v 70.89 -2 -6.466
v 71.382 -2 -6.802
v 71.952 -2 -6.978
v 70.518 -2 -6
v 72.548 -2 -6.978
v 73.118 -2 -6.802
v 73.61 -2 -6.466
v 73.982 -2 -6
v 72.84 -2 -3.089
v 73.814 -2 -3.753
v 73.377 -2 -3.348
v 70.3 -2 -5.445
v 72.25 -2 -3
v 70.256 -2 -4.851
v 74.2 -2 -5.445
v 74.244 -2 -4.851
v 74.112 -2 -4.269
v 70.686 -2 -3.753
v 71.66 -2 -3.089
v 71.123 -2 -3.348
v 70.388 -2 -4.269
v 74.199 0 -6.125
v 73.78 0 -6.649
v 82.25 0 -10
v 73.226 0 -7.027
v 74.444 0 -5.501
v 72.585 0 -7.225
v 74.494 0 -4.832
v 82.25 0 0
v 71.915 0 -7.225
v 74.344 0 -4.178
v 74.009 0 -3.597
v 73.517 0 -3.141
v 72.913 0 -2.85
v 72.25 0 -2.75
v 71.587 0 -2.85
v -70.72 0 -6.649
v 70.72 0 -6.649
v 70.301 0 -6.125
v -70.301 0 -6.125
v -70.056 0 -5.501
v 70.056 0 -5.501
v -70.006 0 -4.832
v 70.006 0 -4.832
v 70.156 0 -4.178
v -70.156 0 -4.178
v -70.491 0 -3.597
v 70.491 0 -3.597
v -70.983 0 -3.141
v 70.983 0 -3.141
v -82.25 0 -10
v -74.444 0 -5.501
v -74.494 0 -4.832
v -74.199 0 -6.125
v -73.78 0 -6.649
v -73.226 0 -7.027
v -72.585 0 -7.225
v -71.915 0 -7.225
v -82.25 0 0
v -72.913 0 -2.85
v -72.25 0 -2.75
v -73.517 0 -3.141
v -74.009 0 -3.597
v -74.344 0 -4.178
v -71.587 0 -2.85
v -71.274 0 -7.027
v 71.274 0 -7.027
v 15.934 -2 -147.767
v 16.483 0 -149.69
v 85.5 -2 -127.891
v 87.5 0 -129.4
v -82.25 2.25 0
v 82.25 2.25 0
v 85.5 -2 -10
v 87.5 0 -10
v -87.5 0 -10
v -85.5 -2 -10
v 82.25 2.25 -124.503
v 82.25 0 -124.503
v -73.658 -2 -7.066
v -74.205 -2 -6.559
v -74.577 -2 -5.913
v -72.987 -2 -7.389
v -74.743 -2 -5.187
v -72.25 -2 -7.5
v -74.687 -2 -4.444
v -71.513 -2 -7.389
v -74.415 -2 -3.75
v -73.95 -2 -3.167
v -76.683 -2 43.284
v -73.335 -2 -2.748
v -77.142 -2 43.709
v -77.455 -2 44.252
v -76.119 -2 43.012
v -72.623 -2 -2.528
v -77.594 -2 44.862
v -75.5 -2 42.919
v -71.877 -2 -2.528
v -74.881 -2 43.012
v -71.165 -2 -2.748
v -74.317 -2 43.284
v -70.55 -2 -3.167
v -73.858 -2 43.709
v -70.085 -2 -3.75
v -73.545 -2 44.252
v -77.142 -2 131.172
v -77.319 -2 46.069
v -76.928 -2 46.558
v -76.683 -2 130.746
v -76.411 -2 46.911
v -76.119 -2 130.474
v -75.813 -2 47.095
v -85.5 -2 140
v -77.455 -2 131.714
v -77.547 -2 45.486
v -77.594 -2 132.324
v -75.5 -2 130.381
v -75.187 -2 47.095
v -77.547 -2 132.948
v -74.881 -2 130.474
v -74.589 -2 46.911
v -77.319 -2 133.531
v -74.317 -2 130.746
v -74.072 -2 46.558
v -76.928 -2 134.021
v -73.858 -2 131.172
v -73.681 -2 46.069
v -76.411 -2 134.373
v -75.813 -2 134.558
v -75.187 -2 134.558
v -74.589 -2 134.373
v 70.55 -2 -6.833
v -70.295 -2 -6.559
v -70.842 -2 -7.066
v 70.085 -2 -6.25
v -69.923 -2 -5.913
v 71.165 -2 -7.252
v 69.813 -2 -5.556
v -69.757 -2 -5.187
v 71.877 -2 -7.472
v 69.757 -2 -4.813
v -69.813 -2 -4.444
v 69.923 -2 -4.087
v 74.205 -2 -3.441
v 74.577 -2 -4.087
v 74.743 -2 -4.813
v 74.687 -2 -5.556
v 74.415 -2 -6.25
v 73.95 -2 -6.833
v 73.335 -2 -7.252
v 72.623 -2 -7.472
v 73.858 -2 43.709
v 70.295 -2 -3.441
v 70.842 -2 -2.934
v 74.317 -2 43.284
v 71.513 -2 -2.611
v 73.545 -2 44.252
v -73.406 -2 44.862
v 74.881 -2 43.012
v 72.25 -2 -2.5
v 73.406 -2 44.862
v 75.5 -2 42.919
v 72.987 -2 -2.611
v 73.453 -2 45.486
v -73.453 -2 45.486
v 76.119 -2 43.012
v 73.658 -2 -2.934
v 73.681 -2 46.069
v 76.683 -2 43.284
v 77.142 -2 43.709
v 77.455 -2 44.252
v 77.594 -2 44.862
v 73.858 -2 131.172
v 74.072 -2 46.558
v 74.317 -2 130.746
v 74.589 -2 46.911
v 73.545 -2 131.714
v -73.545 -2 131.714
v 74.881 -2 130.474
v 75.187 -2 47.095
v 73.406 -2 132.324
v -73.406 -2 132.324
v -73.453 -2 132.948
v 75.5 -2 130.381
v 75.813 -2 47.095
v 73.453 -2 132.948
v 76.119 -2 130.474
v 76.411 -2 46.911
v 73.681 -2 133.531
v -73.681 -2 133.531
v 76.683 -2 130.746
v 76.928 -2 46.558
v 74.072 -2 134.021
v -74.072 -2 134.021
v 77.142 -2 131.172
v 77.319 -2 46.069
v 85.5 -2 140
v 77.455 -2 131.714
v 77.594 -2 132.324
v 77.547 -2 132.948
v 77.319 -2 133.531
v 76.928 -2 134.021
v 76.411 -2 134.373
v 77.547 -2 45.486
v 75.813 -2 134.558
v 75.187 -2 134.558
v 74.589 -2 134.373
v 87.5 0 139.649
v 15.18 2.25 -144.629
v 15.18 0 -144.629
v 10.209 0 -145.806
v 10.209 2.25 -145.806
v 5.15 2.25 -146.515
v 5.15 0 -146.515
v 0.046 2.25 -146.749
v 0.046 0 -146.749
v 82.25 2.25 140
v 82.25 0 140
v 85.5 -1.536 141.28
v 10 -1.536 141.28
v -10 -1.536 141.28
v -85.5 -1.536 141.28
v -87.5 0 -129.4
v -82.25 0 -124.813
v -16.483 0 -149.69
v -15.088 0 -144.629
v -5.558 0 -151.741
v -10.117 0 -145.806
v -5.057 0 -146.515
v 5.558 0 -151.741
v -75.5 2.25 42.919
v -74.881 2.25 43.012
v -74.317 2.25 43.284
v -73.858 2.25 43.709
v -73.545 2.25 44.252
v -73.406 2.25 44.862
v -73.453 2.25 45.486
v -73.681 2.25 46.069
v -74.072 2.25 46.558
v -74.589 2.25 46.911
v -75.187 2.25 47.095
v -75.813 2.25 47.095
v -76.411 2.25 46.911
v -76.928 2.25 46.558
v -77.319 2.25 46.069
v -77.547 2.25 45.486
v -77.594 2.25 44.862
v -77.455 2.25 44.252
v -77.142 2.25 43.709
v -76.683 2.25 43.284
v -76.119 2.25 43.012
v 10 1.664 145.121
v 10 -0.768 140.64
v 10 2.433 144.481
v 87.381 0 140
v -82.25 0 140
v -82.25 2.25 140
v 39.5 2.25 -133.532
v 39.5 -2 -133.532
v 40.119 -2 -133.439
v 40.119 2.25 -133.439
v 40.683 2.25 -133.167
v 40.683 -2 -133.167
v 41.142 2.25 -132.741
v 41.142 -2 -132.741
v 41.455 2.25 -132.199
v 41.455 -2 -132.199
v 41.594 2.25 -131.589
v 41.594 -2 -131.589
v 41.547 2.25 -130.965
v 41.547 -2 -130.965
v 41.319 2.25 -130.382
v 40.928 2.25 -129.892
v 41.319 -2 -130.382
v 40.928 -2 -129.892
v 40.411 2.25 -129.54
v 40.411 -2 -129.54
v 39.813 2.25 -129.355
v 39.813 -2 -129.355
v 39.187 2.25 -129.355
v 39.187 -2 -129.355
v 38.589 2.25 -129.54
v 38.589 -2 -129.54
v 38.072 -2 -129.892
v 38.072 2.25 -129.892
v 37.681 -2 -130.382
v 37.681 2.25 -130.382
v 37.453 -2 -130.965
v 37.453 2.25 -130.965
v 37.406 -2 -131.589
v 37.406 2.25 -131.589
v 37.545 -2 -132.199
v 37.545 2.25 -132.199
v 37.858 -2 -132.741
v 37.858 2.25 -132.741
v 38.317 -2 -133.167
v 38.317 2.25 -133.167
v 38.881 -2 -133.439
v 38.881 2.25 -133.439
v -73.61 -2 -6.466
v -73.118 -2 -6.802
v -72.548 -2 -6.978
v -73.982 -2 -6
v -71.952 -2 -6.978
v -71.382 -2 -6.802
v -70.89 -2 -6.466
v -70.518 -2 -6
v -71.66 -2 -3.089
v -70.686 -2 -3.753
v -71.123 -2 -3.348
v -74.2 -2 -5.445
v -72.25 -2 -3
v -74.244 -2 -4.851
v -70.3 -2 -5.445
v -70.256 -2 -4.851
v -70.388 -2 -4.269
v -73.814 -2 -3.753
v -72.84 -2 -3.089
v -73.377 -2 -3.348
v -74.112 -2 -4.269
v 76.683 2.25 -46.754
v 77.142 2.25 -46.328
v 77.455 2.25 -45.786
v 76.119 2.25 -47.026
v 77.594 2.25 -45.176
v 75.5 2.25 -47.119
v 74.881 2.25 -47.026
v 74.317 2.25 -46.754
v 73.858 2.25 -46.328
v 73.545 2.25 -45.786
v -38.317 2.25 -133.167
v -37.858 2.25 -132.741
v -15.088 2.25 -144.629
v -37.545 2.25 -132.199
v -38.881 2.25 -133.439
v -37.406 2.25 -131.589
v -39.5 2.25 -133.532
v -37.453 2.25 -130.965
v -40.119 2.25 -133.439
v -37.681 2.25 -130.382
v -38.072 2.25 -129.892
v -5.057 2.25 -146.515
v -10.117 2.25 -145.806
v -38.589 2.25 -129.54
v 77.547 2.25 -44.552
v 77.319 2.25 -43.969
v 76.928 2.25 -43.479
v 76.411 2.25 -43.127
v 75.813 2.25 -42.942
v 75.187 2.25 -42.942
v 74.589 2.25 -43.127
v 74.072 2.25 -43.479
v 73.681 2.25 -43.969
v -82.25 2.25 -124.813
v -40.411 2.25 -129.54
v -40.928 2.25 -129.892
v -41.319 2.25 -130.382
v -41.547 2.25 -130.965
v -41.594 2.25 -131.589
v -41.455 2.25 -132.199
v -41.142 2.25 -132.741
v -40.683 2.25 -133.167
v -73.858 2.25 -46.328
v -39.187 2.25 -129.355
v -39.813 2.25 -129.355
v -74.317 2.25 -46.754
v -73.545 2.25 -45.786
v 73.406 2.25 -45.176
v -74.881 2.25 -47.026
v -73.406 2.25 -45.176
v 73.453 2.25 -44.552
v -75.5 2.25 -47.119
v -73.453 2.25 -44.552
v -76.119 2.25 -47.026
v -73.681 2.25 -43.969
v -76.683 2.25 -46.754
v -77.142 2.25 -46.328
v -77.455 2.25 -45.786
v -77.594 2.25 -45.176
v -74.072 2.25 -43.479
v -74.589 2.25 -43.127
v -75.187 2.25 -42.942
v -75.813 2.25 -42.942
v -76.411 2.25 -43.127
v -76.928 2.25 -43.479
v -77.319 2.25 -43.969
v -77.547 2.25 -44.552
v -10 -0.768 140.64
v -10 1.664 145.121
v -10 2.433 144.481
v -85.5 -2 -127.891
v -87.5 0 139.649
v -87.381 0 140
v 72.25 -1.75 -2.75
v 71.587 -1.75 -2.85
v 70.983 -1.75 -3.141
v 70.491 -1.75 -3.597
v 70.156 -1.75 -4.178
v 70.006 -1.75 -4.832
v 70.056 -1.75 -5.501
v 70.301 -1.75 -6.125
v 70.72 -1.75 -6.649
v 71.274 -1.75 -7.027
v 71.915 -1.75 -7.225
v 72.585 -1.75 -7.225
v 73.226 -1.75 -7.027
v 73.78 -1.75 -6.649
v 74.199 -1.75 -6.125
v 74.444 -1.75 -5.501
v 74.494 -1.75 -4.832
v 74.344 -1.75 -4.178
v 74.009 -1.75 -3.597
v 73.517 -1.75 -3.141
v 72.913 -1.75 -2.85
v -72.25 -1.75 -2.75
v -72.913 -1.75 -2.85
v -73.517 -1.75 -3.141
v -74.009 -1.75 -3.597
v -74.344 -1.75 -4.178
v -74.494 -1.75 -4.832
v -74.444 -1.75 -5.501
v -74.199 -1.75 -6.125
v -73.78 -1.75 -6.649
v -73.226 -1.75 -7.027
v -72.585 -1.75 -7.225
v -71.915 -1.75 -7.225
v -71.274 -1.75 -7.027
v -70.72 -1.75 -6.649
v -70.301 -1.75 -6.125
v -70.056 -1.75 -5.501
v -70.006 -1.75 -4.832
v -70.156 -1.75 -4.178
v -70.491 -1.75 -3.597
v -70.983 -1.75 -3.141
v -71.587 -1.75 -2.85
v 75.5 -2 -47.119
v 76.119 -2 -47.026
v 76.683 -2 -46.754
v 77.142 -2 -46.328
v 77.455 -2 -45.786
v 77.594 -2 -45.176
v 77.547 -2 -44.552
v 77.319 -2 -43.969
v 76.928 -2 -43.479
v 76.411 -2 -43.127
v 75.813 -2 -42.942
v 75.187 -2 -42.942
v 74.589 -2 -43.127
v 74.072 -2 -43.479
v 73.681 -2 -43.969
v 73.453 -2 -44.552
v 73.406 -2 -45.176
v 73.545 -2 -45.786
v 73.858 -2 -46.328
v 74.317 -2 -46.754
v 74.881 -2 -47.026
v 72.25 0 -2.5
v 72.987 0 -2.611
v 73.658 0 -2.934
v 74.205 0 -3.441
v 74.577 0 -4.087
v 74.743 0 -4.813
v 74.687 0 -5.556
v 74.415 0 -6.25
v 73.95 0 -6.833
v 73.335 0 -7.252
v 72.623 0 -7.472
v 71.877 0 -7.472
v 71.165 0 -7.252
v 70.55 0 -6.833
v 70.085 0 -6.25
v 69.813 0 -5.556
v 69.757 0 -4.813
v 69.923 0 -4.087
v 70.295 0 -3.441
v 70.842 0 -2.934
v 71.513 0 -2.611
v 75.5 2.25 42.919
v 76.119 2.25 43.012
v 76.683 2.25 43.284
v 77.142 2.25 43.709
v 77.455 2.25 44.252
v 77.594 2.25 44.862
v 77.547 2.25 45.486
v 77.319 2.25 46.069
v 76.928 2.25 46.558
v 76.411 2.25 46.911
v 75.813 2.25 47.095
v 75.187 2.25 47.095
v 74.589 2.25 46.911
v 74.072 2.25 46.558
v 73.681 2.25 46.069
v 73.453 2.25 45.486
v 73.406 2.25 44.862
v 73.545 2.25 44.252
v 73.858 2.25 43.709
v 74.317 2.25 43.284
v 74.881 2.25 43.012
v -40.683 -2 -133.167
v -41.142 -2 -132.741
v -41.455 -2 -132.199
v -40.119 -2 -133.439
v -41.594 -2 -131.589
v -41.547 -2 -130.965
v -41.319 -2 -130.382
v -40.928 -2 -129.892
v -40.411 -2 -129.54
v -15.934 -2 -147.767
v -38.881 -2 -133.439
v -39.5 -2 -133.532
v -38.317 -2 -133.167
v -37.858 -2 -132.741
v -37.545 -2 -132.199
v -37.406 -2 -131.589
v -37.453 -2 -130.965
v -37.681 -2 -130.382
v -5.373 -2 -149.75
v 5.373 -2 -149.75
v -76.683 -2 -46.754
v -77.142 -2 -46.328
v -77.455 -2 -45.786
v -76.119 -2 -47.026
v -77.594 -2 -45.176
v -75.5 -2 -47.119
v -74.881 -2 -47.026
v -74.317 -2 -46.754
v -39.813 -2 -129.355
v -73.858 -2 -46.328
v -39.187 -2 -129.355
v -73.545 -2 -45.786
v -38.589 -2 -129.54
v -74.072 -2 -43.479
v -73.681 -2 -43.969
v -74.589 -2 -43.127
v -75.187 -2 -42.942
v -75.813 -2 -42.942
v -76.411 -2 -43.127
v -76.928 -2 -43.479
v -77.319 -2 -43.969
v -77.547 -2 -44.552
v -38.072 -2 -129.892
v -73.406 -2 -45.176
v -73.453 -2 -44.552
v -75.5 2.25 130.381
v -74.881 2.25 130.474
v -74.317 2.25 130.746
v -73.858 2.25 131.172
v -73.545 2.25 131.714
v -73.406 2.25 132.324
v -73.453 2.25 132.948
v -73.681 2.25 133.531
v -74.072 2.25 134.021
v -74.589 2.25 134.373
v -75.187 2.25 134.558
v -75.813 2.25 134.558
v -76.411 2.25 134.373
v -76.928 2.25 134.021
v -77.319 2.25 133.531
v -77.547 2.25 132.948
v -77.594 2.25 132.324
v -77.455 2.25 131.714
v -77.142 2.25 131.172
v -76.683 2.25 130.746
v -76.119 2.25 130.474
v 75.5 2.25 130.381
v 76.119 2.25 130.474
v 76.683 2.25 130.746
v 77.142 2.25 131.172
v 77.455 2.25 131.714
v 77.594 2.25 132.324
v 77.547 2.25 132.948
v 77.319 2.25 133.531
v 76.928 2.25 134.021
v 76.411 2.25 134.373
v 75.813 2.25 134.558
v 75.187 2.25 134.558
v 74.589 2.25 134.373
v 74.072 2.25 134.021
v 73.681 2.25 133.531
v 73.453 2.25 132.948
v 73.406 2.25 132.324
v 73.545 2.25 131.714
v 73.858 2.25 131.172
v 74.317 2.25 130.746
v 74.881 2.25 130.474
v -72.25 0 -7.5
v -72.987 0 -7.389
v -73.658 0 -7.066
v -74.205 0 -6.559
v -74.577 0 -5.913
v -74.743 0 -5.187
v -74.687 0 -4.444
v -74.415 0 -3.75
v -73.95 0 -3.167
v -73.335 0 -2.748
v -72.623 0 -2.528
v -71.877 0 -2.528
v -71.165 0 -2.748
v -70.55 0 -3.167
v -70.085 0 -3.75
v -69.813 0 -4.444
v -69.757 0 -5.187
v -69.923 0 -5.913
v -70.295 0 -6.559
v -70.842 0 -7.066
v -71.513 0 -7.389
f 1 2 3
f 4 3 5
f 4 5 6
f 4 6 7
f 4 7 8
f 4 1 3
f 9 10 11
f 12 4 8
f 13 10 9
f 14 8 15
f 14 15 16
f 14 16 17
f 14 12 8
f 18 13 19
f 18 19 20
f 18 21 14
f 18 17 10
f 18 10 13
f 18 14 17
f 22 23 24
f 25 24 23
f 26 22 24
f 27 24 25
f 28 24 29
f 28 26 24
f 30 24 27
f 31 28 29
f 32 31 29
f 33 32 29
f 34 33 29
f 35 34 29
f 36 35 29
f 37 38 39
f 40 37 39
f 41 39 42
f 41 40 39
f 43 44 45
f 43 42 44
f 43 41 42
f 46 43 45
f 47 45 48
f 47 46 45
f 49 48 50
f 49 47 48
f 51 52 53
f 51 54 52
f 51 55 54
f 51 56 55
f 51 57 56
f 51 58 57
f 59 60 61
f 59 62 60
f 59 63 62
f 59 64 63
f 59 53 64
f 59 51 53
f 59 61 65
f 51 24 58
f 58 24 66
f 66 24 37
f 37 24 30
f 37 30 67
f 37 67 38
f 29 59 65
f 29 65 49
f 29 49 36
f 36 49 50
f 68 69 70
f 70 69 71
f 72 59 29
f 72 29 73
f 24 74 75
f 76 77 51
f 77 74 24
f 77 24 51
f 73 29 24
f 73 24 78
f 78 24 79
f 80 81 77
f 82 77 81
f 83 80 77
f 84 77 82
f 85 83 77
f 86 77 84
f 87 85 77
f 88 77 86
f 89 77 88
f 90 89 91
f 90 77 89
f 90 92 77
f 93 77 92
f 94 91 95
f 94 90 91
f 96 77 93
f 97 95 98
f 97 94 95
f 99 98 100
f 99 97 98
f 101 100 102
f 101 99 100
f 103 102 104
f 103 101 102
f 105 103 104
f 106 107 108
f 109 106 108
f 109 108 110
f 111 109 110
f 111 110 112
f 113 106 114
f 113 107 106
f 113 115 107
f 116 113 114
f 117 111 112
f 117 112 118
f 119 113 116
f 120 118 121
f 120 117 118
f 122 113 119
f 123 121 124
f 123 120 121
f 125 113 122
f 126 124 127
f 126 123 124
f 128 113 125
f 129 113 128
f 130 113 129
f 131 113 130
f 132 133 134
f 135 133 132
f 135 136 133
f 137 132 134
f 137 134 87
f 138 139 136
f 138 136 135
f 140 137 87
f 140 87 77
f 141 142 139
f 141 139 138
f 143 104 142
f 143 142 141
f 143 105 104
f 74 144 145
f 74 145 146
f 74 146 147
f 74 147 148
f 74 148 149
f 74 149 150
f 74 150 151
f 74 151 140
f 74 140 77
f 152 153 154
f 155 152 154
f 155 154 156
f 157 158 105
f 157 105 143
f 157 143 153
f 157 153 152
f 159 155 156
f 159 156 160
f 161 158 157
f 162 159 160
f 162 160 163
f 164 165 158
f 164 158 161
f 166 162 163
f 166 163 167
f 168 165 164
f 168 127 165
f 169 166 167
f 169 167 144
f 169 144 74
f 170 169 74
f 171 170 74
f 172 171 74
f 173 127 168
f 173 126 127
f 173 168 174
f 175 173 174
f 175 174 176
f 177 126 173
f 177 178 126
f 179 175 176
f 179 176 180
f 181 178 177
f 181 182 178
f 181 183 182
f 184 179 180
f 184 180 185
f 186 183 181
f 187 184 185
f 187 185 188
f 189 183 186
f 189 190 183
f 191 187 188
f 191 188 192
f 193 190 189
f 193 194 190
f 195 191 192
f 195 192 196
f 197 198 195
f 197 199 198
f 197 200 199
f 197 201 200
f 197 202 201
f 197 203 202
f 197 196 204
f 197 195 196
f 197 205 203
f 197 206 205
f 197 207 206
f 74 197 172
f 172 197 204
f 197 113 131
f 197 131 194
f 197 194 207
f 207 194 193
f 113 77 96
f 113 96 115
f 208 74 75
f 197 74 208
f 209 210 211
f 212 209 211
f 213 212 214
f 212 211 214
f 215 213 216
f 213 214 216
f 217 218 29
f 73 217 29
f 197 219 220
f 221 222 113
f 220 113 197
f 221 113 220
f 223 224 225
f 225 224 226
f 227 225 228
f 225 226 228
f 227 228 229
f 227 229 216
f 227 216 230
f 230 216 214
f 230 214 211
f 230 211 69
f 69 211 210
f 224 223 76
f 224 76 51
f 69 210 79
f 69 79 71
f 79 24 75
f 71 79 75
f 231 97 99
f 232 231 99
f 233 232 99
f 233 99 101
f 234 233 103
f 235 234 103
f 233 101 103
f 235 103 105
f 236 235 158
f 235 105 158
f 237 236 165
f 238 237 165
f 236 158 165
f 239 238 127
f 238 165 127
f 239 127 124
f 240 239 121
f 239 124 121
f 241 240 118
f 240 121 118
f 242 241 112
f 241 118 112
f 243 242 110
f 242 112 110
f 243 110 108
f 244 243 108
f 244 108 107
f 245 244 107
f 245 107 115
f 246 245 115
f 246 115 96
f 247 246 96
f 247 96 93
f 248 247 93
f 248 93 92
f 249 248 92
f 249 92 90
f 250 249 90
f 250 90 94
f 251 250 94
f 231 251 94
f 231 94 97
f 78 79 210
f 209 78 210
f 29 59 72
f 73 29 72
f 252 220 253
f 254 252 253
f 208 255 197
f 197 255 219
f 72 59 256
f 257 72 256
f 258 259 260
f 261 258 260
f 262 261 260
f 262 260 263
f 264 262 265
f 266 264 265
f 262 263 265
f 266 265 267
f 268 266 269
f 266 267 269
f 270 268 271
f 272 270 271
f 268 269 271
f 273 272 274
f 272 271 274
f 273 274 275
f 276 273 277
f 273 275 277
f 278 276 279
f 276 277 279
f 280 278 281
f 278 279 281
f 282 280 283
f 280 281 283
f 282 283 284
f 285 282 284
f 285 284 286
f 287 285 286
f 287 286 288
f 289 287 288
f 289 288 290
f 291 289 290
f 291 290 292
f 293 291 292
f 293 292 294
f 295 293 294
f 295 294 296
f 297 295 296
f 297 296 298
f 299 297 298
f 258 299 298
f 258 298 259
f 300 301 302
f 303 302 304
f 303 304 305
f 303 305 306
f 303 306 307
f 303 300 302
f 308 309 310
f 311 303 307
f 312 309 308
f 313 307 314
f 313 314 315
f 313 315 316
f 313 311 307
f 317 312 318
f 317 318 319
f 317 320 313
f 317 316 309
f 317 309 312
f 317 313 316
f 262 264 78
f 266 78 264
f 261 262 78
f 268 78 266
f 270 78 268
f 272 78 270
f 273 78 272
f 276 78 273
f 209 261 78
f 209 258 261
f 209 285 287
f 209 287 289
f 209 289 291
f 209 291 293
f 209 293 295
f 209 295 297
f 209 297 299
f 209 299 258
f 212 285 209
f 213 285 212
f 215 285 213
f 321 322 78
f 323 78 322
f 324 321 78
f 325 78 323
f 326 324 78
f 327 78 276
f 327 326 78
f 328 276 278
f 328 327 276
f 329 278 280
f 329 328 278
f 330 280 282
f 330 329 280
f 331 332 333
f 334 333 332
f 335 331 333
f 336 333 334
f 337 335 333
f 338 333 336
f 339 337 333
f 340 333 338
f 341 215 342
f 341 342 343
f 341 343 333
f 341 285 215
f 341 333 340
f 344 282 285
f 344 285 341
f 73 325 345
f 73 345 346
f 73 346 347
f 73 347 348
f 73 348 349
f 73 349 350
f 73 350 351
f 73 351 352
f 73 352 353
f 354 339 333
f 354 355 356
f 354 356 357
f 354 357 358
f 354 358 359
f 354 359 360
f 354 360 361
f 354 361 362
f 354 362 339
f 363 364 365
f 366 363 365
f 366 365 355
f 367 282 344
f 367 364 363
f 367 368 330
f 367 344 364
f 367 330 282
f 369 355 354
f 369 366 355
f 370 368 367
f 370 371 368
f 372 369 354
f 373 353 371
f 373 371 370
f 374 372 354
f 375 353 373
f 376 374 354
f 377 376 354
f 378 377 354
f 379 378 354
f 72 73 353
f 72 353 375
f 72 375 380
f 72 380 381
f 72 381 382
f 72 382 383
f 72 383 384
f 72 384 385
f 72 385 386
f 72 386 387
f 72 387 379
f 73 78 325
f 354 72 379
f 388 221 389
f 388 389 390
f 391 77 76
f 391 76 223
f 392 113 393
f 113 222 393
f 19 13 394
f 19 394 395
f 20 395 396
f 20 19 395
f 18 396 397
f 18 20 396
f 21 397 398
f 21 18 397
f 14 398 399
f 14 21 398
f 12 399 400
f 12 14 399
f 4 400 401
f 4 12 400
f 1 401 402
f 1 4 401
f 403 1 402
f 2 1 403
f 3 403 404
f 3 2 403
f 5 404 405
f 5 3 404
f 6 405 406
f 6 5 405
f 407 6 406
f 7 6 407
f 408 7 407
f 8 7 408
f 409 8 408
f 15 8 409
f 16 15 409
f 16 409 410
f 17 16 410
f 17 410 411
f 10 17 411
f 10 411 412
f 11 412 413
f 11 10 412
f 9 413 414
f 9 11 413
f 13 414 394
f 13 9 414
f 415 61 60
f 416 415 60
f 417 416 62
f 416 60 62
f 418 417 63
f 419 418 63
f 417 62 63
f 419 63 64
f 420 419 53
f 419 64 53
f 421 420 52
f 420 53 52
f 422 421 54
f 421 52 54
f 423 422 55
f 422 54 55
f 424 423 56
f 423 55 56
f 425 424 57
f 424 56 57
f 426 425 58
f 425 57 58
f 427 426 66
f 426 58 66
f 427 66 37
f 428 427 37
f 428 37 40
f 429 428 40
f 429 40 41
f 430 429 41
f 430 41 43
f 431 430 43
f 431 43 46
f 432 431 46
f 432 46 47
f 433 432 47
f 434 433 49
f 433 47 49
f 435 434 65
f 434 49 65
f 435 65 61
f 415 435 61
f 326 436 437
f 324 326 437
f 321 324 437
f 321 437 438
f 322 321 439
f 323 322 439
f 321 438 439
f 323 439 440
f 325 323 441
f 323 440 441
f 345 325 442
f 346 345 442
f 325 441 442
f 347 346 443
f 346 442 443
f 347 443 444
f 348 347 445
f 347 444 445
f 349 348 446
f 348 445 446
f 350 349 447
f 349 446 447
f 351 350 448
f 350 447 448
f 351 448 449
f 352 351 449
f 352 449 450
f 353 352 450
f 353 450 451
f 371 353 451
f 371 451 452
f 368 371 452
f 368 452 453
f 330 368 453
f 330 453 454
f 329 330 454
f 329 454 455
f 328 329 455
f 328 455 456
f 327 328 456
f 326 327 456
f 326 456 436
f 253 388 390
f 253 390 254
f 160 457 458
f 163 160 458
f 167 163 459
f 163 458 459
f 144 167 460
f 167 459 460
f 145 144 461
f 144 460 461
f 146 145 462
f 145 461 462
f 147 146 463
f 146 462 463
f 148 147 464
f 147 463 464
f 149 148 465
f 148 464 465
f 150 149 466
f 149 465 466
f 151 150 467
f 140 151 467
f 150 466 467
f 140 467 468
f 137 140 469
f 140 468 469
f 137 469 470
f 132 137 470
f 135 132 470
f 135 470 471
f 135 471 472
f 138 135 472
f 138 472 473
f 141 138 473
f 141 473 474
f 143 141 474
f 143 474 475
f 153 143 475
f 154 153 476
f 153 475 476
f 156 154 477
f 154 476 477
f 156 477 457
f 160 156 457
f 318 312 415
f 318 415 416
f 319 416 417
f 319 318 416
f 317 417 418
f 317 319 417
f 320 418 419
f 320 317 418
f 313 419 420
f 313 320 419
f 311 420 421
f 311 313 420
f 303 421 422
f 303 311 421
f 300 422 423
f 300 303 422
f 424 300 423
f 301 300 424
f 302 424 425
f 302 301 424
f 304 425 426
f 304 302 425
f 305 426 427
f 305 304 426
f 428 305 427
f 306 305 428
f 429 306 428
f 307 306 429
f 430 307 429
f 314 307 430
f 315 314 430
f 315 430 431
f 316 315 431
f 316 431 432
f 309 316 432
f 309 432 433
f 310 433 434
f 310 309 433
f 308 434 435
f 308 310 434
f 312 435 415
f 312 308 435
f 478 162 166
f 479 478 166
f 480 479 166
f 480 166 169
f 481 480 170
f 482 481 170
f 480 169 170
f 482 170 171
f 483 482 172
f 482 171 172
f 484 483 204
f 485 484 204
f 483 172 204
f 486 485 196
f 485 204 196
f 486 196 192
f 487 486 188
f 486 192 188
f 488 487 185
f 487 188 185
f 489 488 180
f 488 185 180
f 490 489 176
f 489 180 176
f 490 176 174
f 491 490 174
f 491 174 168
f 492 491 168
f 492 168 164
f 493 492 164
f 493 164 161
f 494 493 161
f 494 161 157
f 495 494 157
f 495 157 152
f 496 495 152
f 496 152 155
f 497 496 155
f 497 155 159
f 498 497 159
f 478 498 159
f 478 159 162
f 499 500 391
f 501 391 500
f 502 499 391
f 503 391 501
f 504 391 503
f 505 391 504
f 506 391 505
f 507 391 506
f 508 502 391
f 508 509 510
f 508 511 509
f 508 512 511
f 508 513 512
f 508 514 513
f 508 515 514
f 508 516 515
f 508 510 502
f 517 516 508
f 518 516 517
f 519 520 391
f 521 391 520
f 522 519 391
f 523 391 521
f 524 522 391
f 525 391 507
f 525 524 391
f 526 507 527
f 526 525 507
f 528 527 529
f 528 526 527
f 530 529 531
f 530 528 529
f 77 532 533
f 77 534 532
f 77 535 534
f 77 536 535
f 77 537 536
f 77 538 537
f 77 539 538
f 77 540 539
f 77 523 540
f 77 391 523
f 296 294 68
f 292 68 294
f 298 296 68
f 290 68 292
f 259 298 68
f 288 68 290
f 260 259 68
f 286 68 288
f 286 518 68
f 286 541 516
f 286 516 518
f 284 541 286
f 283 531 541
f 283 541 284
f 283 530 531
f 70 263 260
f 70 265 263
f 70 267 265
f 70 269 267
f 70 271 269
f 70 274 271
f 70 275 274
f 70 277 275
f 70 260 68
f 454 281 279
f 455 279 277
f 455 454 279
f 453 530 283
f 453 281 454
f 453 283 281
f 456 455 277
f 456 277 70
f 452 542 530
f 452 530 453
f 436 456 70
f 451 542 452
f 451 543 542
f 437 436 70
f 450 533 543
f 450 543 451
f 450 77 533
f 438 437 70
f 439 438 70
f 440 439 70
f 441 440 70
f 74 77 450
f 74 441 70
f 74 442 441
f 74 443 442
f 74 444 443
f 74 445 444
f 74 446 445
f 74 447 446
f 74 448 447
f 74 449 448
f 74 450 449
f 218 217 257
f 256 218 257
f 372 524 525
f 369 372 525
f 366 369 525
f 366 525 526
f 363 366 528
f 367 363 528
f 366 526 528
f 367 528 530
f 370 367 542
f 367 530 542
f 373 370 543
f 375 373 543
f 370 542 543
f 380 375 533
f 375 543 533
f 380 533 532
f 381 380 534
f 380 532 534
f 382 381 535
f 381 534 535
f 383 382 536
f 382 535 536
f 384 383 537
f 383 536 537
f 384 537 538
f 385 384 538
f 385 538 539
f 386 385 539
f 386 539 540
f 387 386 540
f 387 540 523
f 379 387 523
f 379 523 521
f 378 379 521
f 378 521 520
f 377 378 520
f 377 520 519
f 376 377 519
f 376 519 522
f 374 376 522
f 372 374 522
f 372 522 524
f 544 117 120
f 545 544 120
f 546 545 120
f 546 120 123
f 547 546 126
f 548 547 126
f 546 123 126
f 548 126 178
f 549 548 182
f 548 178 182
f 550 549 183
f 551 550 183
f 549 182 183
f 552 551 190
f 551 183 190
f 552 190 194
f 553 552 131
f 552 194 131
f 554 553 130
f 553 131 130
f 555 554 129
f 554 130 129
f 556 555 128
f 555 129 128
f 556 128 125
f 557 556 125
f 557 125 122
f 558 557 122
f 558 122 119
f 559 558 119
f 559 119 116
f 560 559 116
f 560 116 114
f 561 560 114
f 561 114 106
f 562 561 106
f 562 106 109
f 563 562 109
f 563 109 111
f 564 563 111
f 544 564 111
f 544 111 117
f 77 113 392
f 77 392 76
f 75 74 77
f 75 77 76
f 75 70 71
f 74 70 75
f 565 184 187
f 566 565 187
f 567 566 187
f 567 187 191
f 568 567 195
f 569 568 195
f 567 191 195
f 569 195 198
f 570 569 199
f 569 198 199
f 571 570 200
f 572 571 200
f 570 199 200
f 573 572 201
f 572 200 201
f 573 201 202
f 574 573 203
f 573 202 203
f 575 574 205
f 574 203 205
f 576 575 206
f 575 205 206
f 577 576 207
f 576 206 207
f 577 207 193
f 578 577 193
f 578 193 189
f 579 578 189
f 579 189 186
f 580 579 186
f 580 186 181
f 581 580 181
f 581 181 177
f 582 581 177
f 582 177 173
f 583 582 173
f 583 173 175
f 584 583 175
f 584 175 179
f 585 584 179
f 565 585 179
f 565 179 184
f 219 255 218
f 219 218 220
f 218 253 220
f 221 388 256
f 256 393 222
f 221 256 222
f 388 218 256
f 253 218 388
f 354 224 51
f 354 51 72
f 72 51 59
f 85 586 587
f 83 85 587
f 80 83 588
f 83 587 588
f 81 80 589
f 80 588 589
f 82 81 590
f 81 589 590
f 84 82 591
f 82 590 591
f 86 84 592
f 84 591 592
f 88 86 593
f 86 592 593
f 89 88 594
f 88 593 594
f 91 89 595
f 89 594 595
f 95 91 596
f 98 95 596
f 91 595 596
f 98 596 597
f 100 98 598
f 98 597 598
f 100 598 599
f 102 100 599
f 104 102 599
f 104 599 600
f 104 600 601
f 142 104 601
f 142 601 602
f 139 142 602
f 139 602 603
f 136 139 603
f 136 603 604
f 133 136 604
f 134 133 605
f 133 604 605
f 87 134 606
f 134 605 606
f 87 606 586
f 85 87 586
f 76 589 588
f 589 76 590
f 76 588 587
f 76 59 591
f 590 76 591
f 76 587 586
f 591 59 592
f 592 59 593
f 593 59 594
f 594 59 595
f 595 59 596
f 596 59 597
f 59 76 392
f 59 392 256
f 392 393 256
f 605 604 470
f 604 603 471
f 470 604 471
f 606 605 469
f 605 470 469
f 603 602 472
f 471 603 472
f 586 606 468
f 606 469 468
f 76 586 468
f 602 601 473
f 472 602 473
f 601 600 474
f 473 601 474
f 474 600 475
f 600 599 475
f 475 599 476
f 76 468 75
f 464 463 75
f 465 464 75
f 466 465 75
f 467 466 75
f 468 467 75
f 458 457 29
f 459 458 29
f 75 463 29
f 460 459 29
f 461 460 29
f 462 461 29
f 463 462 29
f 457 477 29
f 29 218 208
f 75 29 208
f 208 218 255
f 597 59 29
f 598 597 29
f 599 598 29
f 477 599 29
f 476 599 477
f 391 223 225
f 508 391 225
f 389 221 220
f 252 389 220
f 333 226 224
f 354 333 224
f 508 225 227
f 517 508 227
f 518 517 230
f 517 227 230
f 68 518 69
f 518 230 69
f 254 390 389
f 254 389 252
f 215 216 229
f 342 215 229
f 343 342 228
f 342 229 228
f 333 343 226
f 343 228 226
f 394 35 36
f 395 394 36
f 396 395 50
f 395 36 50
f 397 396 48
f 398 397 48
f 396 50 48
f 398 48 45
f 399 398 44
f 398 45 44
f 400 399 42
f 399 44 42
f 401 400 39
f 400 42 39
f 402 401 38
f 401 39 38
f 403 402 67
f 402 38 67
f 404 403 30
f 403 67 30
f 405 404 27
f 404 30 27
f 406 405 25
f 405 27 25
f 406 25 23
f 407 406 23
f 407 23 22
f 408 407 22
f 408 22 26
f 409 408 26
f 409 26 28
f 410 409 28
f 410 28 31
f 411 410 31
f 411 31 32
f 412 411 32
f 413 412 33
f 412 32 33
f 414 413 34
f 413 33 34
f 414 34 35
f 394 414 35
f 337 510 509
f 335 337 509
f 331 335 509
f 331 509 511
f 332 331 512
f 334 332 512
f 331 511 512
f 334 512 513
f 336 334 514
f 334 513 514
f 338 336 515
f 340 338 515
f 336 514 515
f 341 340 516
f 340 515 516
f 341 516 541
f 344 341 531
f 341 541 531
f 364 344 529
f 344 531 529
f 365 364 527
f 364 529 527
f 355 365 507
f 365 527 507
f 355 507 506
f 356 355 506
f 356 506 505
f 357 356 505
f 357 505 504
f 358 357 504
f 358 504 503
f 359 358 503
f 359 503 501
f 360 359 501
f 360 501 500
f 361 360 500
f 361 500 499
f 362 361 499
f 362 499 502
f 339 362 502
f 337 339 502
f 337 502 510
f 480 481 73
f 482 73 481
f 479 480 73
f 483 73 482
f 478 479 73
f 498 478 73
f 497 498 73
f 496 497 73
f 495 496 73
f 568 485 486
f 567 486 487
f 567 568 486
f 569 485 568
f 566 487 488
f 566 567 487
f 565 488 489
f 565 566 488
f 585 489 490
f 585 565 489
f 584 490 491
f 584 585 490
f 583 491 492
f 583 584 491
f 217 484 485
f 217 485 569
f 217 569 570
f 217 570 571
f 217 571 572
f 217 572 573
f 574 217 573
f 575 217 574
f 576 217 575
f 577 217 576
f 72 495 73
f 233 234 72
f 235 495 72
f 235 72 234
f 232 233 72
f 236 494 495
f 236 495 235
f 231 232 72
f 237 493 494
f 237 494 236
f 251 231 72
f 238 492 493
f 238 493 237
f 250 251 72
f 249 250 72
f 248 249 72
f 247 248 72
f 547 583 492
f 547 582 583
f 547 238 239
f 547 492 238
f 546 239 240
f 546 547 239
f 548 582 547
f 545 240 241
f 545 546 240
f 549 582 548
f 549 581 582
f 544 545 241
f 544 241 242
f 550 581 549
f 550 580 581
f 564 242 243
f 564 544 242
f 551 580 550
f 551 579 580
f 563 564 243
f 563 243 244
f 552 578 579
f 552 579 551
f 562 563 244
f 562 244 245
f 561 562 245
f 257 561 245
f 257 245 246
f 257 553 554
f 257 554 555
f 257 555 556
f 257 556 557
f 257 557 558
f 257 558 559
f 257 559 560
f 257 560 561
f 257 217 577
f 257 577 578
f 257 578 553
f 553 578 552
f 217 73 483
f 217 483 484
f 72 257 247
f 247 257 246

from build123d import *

# Parameters (mm, degrees)
BOSS_EXTRUDE1_DEPTH      = 2.25
BOSS_EXTRUDE2_DEPTH      = 2
CHAMFER1_SIZE            = 2
CUT_EXTRUDE1_REACH       = 177.436
SKETCH5_R                = 2.1
SPLIT1_SURFACE_1_BACK    = 341.45
SPLIT1_SURFACE_1_DEPTH   = 682.9
SPLIT1_SURFACE_2_BACK    = 341.45
SPLIT1_SURFACE_2_DEPTH   = 682.9
SKETCH7_R                = 2.25
BOSS_EXTRUDE3_DEPTH      = 2
CHAMFER2_SIZE            = 0.25
SKETCH9_R                = 2.5
CUT_EXTRUDE2_DEPTH       = 2
BOSS_EXTRUDE5_DEPTH      = 87.5
BOSS_EXTRUDE5_DEPTH_BACK = 87.5
CHAMFER3_SIZE            = 2
SKETCH13_W               = 20
SKETCH13_H               = 1
BOSS_EXTRUDE6_DEPTH      = 5


# Some blends are built 0.0001 mm under size
with BuildPart() as part:
    # Sketch3 → Boss-Extrude1 (new body)
    with BuildSketch(Plane.XZ):
        with BuildLine():
            Line((82.25, 140), (82.25, -124.502754064))
            Line((82.25, -124.502754064), (15.180121042, -144.629148882))
            ThreePointArc((15.180121042, -144.629148882), (7.687460253, -146.219552794), (0.046174732, -146.748803111))
            ThreePointArc((0.046174732, -146.748803111), (-7.595110788, -146.219552794), (-15.087771577, -144.629148882))
            Line((-15.087771577, -144.629148882), (-82.25, -124.813107271))
            Line((-82.25, -124.813107271), (-82.25, 140))
            Line((-82.25, 140), (82.25, 140))
        make_face()
    extrude(amount=-BOSS_EXTRUDE1_DEPTH)

    # Sketch4 → Boss-Extrude2 (add)
    with BuildSketch(Plane.XZ):
        with BuildLine():
            Line((87.5, 140), (-87.5, 140))
            Line((-87.5, 140), (-87.5, -129.399764523))
            Line((-87.5, -129.399764523), (-16.483267674, -149.690259473))
            ThreePointArc((-16.483267674, -149.690259473), (0, -151.998822615), (16.483267674, -149.690259473))
            Line((16.483267674, -149.690259473), (87.5, -129.399764523))
            Line((87.5, -129.399764523), (87.5, 140))
        make_face()
    extrude(amount=BOSS_EXTRUDE2_DEPTH)

    # Chamfer1
    chamfer1_edges = [part.edges().sort_by_distance(p)[0] for p in [
        (87.5, -2, 5.300117739),
        (51.991633837, -2, -139.545011998),
        (0, -2, -151.998822615),
        (-51.991633837, -2, -139.545011998),
        (-87.5, -2, 5.300117739),
    ]]
    chamfer(chamfer1_edges, length=CHAMFER1_SIZE - 0.0001)  # a hair under: the kernel refuses the full size

    # Sketch5 → Cut-Extrude1 (cut, up to next)
    with BuildSketch(Plane.XZ.offset(2), mode=Mode.PRIVATE) as cut_extrude1_sk1:
        with Locations(Location((39.5, -131.431881025, 0), (0, 0, 270))):
            Circle(SKETCH5_R)
    cut_extrude1_tool1 = extrude(cut_extrude1_sk1.sketch, amount=-CUT_EXTRUDE1_REACH, mode=Mode.PRIVATE) & part.part
    # Sketch5 → Cut-Extrude1 (cut, up to next)
    with BuildSketch(Plane.XZ.offset(2), mode=Mode.PRIVATE) as cut_extrude1_sk2:
        with Locations(Location((75.5, -45.018802154, 0), (0, 0, 270))):
            Circle(SKETCH5_R)
    cut_extrude1_tool2 = extrude(cut_extrude1_sk2.sketch, amount=-CUT_EXTRUDE1_REACH, mode=Mode.PRIVATE) & part.part
    # Sketch5 → Cut-Extrude1 (cut, up to next)
    with BuildSketch(Plane.XZ.offset(2), mode=Mode.PRIVATE) as cut_extrude1_sk3:
        with Locations(Location((75.5, 45.018802154, 0), (0, 0, 270))):
            Circle(SKETCH5_R)
    cut_extrude1_tool3 = extrude(cut_extrude1_sk3.sketch, amount=-CUT_EXTRUDE1_REACH, mode=Mode.PRIVATE) & part.part
    # Sketch5 → Cut-Extrude1 (cut, up to next)
    with BuildSketch(Plane.XZ.offset(2), mode=Mode.PRIVATE) as cut_extrude1_sk4:
        with Locations(Location((75.5, 132.481197846, 0), (0, 0, 270))):
            Circle(SKETCH5_R)
    cut_extrude1_tool4 = extrude(cut_extrude1_sk4.sketch, amount=-CUT_EXTRUDE1_REACH, mode=Mode.PRIVATE) & part.part
    # Sketch5 → Cut-Extrude1 (cut, up to next)
    with BuildSketch(Plane.XZ.offset(2), mode=Mode.PRIVATE) as cut_extrude1_sk5:
        with Locations(Location((-75.5, 132.481197846, 0), (0, 0, 270))):
            Circle(SKETCH5_R)
    cut_extrude1_tool5 = extrude(cut_extrude1_sk5.sketch, amount=-CUT_EXTRUDE1_REACH, mode=Mode.PRIVATE) & part.part
    # Sketch5 → Cut-Extrude1 (cut, up to next)
    with BuildSketch(Plane.XZ.offset(2), mode=Mode.PRIVATE) as cut_extrude1_sk6:
        with Locations(Location((-75.5, 45.018802154, 0), (0, 0, 270))):
            Circle(SKETCH5_R)
    cut_extrude1_tool6 = extrude(cut_extrude1_sk6.sketch, amount=-CUT_EXTRUDE1_REACH, mode=Mode.PRIVATE) & part.part
    # Sketch5 → Cut-Extrude1 (cut, up to next)
    with BuildSketch(Plane.XZ.offset(2), mode=Mode.PRIVATE) as cut_extrude1_sk7:
        with Locations(Location((-75.5, -45.018802154, 0), (0, 0, 270))):
            Circle(SKETCH5_R)
    cut_extrude1_tool7 = extrude(cut_extrude1_sk7.sketch, amount=-CUT_EXTRUDE1_REACH, mode=Mode.PRIVATE) & part.part
    # Sketch5 → Cut-Extrude1 (cut, up to next)
    with BuildSketch(Plane.XZ.offset(2), mode=Mode.PRIVATE) as cut_extrude1_sk8:
        with Locations(Location((-39.5, -131.431881025, 0), (0, 0, 270))):
            Circle(SKETCH5_R)
    cut_extrude1_tool8 = extrude(cut_extrude1_sk8.sketch, amount=-CUT_EXTRUDE1_REACH, mode=Mode.PRIVATE) & part.part
    add(cut_extrude1_tool1.solids().sort_by_distance((39.5, -2, -131.431881))[0], mode=Mode.SUBTRACT)
    add(cut_extrude1_tool2.solids().sort_by_distance((75.5, -2, -45.018802))[0], mode=Mode.SUBTRACT)
    add(cut_extrude1_tool3.solids().sort_by_distance((75.5, -2, 45.018802))[0], mode=Mode.SUBTRACT)
    add(cut_extrude1_tool4.solids().sort_by_distance((75.5, -2, 132.481198))[0], mode=Mode.SUBTRACT)
    add(cut_extrude1_tool5.solids().sort_by_distance((-75.5, -2, 132.481198))[0], mode=Mode.SUBTRACT)
    add(cut_extrude1_tool6.solids().sort_by_distance((-75.5, -2, 45.018802))[0], mode=Mode.SUBTRACT)
    add(cut_extrude1_tool7.solids().sort_by_distance((-75.5, -2, -45.018802))[0], mode=Mode.SUBTRACT)
    add(cut_extrude1_tool8.solids().sort_by_distance((-39.5, -2, -131.431881))[0], mode=Mode.SUBTRACT)


with BuildPart() as body_2:
    # Split1: the piece behind the surface
    add(part.part)
    # Split1 surface: a surface, the sketch's curves swept straight by 682.9 mm
    with BuildLine(Plane(origin=(0, 0, 0), x_dir=(0, 0, -1), z_dir=(1, 0, 0)).offset(-SPLIT1_SURFACE_1_BACK), mode=Mode.PRIVATE) as split1_surface_1_path:
        Line((10, -2), (10, 0))
        Line((10, 0), (0, 0))
        Line((0, 0), (0, 2.25))
    split1_surface_1 = Shell.extrude(split1_surface_1_path.wire(), (1 * SPLIT1_SURFACE_1_DEPTH, 0 * SPLIT1_SURFACE_1_DEPTH, 0 * SPLIT1_SURFACE_1_DEPTH))
    split(bisect_by=split1_surface_1, keep=Keep.BOTTOM)

    # Sketch7 → Boss-Extrude3 (add)
    with BuildSketch(Plane.XZ):
        with Locations(Location((72.25, -5, 0), (0, 0, 90))):
            Circle(SKETCH7_R)
        with Locations(Location((-72.25, -5, 0), (0, 0, 90))):
            Circle(SKETCH7_R)
    extrude(amount=BOSS_EXTRUDE3_DEPTH)

    # Chamfer2
    chamfer2_edges = [body_2.edges().sort_by_distance(p)[0] for p in [
        (72.25, -2, -7.25),
        (-72.25, -2, -7.25),
    ]]
    chamfer(chamfer2_edges, length=CHAMFER2_SIZE)


with BuildPart() as part_1:
    add(part.part)

    # Split1: split by a surface, the side it looks to stays
    # Split1 surface: a surface, the sketch's curves swept straight by 682.9 mm
    with BuildLine(Plane(origin=(0, 0, 0), x_dir=(0, 0, -1), z_dir=(1, 0, 0)).offset(-SPLIT1_SURFACE_2_BACK), mode=Mode.PRIVATE) as split1_surface_2_path:
        Line((10, -2), (10, 0))
        Line((10, 0), (0, 0))
        Line((0, 0), (0, 2.25))
    split1_surface_2 = Shell.extrude(split1_surface_2_path.wire(), (1 * SPLIT1_SURFACE_2_DEPTH, 0 * SPLIT1_SURFACE_2_DEPTH, 0 * SPLIT1_SURFACE_2_DEPTH))
    split(bisect_by=split1_surface_2, keep=Keep.TOP)

    # Sketch9 → Cut-Extrude2 (cut)
    with BuildSketch(Plane(origin=(0, 0, 0), x_dir=(1, 0, 0), z_dir=(0, 1, 0))):
        with Locations(Location((72.25, 5, 0), (0, 0, 270))):
            Circle(SKETCH9_R)
        with Locations(Location((-72.25, 5, 0), (0, 0, 90))):
            Circle(SKETCH9_R)
    extrude(amount=-CUT_EXTRUDE2_DEPTH, mode=Mode.SUBTRACT)

    # Sketch12 → Boss-Extrude5 (add, two sides: drawn at the far end of the back side and taken through both)
    with BuildSketch(Plane(origin=(0, 0, 0), x_dir=(0, 0, -1), z_dir=(1, 0, 0)).offset(-BOSS_EXTRUDE5_DEPTH_BACK)):
        Polygon((-140, -2), (-140, 0), (-141.280368799, -1.536442559), align=None)
    extrude(amount=BOSS_EXTRUDE5_DEPTH + BOSS_EXTRUDE5_DEPTH_BACK)

    # Chamfer3
    # the kernel refuses this chamfer: 2 mm, written as the material it takes off along each edge
    with BuildSketch(Plane(origin=(87.5, 0.21448916, 146.11652964), x_dir=(0.027495876610589054, 0.9399160769008188, -0.34029655471777764), z_dir=(0, -0.34042526375297005, -0.9402715776831292)), Plane(origin=(-87.5, 0.21448916, 146.11652964), x_dir=(0.999621916911297, -0.025853591280412175, 0.009360291047276351), z_dir=(0, -0.34042526375297005, -0.9402715776831292))) as chamfer3_piece_1:
        Polygon((CHAMFER3_SIZE * 0.999621916911, -CHAMFER3_SIZE * 0.0274958766106), (-CHAMFER3_SIZE * 0.0274958766106, -CHAMFER3_SIZE * 0.999621916911), (0, 0), align=None)
    extrude(amount=11.648433007, mode=Mode.SUBTRACT)

    # Sketch13 → Boss-Extrude6 (add)
    with BuildSketch(Plane(origin=(0, 68.852459016, 82.62295082), x_dir=(1, 0, 0), z_dir=(0, 0.6401843996644769, 0.7682212795973784))):
        with Locations((0, -91.125815953)):
            Rectangle(SKETCH13_W, SKETCH13_H)
    extrude(amount=BOSS_EXTRUDE6_DEPTH)


solid = Compound([body_2.part, part_1.part])
